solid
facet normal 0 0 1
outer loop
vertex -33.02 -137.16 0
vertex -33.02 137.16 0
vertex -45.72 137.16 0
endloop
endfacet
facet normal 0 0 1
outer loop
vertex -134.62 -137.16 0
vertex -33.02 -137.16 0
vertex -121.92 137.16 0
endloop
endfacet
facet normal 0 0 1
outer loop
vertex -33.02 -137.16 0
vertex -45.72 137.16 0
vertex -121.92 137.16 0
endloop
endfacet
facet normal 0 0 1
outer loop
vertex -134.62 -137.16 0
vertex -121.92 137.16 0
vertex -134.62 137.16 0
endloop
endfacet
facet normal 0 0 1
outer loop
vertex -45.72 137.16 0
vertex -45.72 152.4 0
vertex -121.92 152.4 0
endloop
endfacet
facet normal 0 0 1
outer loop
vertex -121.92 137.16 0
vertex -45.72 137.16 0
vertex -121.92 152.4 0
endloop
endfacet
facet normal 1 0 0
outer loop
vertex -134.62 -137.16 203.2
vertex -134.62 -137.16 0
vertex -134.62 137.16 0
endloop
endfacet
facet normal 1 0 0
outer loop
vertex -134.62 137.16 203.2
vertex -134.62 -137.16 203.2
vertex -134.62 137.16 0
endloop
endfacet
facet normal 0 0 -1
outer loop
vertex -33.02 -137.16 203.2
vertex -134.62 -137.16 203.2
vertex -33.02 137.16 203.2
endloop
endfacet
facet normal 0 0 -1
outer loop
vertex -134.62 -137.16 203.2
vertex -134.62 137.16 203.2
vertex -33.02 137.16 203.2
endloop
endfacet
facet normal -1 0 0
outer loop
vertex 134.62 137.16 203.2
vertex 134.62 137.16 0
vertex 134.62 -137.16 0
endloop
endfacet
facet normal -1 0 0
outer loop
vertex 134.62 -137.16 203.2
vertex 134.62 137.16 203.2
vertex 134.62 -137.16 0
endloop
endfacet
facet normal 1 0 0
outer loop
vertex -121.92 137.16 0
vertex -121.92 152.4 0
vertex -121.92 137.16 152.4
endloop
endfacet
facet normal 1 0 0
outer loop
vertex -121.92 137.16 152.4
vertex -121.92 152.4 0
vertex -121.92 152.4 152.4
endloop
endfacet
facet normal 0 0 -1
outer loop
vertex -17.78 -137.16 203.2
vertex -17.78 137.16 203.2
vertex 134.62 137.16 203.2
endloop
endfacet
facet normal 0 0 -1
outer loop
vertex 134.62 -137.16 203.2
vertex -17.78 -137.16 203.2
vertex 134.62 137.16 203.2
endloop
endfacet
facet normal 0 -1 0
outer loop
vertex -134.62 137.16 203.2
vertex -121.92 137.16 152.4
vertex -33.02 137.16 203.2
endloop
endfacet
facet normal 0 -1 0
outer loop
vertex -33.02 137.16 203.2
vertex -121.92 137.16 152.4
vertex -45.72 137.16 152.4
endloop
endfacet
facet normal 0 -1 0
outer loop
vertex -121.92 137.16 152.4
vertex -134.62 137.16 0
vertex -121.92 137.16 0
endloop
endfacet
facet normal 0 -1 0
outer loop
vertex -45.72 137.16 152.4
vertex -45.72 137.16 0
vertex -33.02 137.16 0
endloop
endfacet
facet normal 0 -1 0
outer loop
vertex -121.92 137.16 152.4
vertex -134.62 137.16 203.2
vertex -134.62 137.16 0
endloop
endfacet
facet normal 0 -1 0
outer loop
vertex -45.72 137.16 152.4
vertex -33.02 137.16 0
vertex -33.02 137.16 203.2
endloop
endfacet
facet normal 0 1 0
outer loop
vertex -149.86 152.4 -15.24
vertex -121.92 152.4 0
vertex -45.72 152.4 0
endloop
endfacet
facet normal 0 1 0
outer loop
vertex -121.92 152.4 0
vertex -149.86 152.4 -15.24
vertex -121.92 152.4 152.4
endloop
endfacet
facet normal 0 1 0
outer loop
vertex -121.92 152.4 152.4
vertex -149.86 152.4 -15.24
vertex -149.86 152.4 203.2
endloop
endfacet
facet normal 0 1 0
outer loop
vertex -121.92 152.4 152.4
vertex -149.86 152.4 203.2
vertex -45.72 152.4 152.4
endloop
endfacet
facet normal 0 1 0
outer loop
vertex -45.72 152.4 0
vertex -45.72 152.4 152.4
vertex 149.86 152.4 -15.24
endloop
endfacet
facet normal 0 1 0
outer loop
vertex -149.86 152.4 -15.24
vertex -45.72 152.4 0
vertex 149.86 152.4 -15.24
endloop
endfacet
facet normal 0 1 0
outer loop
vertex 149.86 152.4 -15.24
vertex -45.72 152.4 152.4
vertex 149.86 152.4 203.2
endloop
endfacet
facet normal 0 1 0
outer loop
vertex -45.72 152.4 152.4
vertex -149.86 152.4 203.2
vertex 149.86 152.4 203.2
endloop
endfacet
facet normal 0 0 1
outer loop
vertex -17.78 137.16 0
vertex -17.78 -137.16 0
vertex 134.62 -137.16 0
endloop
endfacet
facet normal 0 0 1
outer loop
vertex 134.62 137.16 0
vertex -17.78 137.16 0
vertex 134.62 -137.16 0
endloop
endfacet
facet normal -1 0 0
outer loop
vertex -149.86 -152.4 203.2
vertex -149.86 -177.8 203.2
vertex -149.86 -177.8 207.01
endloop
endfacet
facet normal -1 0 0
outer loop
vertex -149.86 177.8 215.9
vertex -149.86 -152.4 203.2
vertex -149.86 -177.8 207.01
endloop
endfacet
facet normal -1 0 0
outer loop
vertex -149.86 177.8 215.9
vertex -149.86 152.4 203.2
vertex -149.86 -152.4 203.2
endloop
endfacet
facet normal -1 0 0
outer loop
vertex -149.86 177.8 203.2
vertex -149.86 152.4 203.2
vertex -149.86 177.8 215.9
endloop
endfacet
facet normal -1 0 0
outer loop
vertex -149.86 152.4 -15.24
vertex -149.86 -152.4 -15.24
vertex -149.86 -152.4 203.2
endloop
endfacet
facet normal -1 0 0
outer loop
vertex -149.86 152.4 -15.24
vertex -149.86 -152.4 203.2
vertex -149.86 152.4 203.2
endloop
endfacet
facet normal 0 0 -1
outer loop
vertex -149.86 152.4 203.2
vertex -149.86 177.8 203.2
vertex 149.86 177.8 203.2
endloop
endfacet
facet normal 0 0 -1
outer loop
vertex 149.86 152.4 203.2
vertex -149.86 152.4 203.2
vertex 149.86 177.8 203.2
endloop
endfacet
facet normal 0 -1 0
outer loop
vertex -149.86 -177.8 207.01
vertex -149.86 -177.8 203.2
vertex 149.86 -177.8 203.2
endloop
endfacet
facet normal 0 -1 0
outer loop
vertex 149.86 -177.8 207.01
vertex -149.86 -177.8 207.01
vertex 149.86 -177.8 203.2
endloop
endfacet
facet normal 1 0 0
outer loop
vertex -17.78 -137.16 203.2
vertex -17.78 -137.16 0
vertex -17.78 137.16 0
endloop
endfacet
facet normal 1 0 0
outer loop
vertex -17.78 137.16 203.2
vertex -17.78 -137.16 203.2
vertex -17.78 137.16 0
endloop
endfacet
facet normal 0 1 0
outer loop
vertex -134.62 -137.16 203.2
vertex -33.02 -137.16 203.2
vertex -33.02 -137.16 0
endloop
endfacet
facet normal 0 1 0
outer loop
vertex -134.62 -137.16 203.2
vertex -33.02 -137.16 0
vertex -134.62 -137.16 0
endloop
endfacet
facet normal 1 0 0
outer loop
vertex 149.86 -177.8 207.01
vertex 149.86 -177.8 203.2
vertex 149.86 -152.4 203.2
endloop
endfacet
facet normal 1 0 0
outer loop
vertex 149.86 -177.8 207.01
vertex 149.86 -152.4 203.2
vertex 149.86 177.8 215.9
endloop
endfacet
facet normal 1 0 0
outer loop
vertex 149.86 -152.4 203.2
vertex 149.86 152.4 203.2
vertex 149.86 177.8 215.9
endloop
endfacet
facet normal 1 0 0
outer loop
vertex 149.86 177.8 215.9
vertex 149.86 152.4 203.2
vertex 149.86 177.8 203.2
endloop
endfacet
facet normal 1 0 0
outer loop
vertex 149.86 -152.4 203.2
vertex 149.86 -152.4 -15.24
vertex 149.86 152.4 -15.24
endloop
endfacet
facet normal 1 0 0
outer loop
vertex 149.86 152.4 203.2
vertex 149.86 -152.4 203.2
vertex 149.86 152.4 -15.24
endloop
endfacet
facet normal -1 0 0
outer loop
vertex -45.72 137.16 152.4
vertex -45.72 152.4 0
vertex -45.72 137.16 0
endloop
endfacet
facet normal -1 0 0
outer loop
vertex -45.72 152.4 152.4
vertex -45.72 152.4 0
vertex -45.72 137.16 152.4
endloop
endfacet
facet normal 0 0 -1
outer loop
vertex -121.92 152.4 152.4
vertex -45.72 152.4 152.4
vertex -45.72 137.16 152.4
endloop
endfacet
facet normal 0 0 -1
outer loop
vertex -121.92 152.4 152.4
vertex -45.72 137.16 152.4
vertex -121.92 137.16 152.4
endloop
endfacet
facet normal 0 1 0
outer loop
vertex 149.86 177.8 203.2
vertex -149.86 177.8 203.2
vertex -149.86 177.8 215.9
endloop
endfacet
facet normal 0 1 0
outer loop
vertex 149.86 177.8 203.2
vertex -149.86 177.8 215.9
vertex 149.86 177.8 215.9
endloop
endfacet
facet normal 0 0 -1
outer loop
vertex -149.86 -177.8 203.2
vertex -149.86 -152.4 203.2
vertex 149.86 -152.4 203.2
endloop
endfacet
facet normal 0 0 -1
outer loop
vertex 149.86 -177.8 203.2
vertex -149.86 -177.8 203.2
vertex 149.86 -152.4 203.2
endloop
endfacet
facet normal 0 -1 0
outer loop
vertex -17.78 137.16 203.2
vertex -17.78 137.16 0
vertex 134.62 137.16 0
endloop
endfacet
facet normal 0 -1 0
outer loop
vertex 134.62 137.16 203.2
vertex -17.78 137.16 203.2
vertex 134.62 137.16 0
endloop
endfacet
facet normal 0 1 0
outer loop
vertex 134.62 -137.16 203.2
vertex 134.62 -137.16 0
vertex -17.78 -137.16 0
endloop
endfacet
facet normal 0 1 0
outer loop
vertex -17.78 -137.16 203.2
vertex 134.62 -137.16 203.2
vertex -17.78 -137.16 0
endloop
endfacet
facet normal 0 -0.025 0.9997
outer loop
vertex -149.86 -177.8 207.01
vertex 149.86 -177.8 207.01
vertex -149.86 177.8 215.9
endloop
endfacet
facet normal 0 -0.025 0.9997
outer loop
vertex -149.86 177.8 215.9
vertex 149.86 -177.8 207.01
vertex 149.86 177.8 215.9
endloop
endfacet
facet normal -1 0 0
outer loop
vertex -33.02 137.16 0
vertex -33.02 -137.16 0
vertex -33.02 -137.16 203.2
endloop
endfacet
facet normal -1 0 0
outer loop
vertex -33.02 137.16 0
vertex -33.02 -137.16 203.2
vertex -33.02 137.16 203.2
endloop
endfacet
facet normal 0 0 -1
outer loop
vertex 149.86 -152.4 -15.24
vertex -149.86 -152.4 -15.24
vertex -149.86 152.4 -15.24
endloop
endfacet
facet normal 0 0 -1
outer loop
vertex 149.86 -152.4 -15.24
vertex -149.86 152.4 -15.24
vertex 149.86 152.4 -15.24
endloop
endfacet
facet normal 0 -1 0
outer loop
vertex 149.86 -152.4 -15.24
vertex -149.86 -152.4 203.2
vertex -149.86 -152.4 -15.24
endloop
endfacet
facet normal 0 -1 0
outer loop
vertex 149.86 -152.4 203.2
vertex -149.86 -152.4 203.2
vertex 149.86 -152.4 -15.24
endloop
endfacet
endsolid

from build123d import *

# Parameters (mm, degrees)
F0_W     = 15.24
F0_H     = 15.24
F0_H_2   = 274.32
F1_DEPTH = 203.2
F2_W     = 299.72
F2_H     = 304.8
F3_DEPTH = 15.24
F4_W     = 299.72
F4_H     = 355.6
F5_DEPTH = 12.7
F6_W     = 76.2
F6_H     = 152.4
F7_DEPTH = 25.4
F9_DEPTH = 373.126


with BuildPart() as f1:
    # F0 (on Top) → F1 (new body)
    with BuildSketch(Plane.XY):
        Polygon((-33.02, 137.16), (-33.02, 152.4), (-149.86, 152.4), (-149.86, -152.4), (-33.02, -152.4), (-33.02, -137.16), (-134.62, -137.16), (-134.62, 137.16), align=None)
        with Locations((-25.4, 144.78)):
            Rectangle(F0_W, F0_H)
        with Locations((-25.4, -144.78)):
            Rectangle(F0_W, F0_H)
        with Locations((-25.4, 0)):
            Rectangle(F0_W, F0_H_2)
        Polygon((149.86, -152.4), (149.86, 152.4), (-17.78, 152.4), (-17.78, 137.16), (134.62, 137.16), (134.62, -137.16), (-17.78, -137.16), (-17.78, -152.4), align=None)
    extrude(amount=F1_DEPTH)

    # F2 (on face) → F3 (join)
    with BuildSketch(Plane(origin=(0, 0, 0), x_dir=(1, 0, 0), z_dir=(0, 0, -1))):
        Rectangle(F2_W, F2_H)
    extrude(amount=F3_DEPTH)

    # F4 (on face) → F5 (join)
    with BuildSketch(Plane.XY.offset(203.2)):
        Rectangle(F4_W, F4_H)
    extrude(amount=F5_DEPTH)

    # F6 (on face) → F7 (cut)
    with BuildSketch(Plane(origin=(0, 152.4, 0), x_dir=(-1, 0, 0), z_dir=(0, 1, 0))):
        with Locations((83.82, 76.2)):
            Rectangle(F6_W, F6_H)
    extrude(amount=-F7_DEPTH, mode=Mode.SUBTRACT)

    # F8 (on face) → F9 (cut)
    with BuildSketch(Plane.YZ.offset(149.86)):
        Polygon((-177.8, 207.01), (177.8, 215.9), (-177.8, 215.9), align=None)
    extrude(amount=-F9_DEPTH, mode=Mode.SUBTRACT)


solid = f1.part
